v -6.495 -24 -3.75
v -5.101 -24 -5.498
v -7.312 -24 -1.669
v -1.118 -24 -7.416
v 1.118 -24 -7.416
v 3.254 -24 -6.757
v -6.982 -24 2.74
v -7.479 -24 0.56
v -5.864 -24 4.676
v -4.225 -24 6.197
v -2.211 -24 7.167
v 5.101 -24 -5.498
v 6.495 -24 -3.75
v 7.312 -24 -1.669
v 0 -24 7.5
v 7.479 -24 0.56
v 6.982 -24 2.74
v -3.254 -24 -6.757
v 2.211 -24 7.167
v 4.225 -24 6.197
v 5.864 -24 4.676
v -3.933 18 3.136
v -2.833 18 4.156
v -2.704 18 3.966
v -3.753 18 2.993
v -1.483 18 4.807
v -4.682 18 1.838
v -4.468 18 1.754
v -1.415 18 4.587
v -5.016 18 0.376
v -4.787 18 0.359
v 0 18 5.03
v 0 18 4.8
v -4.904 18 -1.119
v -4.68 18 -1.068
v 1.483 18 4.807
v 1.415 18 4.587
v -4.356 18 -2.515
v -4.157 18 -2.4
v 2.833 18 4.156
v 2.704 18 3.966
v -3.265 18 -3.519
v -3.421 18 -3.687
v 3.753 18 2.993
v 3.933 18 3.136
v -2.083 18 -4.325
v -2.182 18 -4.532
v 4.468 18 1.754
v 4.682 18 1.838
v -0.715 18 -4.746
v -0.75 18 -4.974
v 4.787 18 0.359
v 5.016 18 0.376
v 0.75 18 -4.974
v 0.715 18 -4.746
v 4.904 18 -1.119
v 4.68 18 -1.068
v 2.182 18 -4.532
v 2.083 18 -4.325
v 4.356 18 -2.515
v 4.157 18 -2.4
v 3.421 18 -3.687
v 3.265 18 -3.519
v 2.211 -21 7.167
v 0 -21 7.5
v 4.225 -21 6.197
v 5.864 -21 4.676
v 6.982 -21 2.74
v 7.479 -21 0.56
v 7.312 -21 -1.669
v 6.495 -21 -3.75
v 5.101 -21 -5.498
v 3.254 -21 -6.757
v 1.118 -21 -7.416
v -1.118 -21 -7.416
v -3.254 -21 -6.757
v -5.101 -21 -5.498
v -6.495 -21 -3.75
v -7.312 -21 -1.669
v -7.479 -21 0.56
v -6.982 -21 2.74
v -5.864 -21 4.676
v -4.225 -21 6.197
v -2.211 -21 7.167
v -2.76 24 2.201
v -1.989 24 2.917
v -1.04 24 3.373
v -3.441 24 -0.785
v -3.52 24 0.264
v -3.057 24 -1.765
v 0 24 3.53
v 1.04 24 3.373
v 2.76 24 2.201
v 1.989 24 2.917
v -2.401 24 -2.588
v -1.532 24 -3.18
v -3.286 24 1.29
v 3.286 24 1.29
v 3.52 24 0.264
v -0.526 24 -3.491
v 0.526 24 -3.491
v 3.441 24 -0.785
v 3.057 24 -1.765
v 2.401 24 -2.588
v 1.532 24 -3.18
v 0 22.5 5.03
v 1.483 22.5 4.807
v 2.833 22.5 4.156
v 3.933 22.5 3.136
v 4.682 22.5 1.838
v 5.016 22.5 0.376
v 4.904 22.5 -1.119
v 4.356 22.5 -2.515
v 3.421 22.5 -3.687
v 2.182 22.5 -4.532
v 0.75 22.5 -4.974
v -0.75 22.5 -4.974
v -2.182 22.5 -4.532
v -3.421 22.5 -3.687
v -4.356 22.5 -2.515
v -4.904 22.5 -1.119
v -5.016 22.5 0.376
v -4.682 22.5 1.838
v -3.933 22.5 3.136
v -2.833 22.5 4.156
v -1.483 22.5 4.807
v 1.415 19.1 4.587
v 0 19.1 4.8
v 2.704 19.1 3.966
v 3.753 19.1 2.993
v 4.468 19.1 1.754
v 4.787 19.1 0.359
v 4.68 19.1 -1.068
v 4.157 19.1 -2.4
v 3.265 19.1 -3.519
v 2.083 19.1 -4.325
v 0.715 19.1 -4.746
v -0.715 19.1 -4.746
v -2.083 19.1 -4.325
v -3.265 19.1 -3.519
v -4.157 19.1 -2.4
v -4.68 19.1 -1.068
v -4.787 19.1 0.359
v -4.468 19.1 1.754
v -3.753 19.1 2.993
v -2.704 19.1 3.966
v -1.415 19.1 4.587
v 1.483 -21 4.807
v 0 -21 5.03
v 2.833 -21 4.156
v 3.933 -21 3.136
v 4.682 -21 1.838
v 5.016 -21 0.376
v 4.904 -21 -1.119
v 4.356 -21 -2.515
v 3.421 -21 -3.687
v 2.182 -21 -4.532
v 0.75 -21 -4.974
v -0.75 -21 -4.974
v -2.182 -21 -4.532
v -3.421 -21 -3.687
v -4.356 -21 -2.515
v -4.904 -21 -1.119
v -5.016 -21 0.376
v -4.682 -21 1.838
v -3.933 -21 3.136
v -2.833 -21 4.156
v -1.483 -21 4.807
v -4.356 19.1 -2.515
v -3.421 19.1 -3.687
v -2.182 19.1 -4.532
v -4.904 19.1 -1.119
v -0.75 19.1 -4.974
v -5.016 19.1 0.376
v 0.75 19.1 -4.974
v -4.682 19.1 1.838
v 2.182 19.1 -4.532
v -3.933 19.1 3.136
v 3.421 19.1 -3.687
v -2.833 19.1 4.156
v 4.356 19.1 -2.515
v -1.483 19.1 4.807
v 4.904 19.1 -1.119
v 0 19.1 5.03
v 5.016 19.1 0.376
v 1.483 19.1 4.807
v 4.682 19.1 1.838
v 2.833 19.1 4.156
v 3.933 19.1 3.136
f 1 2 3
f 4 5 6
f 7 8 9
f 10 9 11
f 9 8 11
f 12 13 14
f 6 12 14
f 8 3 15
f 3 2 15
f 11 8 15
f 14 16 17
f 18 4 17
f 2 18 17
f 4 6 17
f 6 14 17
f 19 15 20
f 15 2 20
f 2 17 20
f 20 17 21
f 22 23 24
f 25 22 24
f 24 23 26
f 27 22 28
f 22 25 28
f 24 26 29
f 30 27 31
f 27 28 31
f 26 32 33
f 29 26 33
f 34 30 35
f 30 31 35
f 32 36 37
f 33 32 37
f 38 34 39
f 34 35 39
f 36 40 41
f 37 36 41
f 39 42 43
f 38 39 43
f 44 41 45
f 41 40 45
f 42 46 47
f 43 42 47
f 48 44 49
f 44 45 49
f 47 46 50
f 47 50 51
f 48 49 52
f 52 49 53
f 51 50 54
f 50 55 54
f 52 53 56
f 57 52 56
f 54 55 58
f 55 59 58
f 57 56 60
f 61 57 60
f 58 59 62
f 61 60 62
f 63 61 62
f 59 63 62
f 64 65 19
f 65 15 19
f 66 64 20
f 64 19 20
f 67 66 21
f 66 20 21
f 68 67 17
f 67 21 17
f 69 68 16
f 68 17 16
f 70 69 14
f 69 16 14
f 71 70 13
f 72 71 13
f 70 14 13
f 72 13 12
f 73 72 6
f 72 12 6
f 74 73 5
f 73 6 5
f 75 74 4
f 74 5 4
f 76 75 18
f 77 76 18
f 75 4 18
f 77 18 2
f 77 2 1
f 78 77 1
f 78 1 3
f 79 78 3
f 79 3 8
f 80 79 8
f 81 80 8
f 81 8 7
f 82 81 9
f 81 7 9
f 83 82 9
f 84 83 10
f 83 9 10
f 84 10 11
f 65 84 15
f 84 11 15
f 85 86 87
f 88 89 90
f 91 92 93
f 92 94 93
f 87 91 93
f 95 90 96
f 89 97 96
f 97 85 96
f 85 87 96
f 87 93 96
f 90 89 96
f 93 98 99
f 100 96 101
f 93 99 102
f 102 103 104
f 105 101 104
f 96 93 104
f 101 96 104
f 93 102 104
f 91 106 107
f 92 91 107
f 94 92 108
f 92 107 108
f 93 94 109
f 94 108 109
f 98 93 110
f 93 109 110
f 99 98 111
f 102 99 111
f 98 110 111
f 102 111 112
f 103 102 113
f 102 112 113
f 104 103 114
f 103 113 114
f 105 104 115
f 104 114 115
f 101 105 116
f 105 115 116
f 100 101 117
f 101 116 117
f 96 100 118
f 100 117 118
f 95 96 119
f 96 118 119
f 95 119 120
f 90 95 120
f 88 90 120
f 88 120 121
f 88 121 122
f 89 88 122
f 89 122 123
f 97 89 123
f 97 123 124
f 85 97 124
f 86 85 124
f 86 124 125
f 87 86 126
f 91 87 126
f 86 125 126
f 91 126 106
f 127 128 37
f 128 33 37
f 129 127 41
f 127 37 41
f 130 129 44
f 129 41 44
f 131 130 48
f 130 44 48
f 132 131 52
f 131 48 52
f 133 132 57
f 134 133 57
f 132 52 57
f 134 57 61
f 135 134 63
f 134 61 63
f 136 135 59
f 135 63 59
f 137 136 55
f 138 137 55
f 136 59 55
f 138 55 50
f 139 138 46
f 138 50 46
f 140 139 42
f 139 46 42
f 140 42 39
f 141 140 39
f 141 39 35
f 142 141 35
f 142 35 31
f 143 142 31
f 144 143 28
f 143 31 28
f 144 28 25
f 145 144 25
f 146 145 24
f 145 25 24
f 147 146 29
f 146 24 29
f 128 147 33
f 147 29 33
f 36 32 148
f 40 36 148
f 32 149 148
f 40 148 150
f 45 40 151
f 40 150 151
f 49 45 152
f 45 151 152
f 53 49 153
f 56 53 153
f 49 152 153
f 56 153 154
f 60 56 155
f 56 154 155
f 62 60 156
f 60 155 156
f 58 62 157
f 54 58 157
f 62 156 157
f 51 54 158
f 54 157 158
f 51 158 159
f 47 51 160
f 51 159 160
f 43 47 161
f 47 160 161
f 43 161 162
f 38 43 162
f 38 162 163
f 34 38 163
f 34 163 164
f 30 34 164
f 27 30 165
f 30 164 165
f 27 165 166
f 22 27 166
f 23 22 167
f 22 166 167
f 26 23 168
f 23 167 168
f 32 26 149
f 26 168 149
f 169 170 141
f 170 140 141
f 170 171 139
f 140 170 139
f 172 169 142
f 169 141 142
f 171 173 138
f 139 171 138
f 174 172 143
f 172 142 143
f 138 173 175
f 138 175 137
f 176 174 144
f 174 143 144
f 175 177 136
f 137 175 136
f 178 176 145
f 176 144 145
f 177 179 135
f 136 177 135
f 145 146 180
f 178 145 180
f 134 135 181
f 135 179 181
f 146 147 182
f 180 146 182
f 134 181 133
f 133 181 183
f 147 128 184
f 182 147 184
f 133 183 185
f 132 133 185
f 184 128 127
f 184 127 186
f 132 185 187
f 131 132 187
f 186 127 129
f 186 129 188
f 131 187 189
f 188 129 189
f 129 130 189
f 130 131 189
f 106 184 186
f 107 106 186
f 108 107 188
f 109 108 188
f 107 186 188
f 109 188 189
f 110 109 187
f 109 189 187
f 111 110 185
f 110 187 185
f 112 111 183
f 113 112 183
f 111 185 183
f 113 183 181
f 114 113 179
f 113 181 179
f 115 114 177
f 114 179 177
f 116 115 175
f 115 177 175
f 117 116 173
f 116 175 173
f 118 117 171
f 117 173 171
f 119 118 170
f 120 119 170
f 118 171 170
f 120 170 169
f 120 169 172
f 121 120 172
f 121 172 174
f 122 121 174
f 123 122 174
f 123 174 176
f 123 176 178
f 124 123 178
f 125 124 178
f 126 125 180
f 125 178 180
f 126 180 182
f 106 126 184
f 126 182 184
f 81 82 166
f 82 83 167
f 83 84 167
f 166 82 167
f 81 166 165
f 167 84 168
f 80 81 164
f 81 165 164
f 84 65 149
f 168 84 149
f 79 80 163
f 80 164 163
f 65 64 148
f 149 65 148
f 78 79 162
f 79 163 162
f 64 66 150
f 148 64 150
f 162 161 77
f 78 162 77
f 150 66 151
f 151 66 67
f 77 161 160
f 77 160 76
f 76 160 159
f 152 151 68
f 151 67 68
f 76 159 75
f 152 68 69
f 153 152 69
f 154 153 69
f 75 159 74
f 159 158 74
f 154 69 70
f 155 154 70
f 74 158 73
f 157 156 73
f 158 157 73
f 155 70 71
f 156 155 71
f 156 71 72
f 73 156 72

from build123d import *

# Parameters (mm, degrees)
F2_SIZE = 1.5


with BuildPart() as f1:
    # F0 (on Right) → F1 (revolve)
    with BuildSketch(Plane.YZ):
        Polygon((-21, 5.03), (-21, 7.5), (-24, 7.5), (-24, 0), (24, 0), (24, 5.03), (19.1, 5.03), (19.1, 4.8), (18, 4.8), (18, 5.03), align=None)
    revolve(axis=Axis((0, 0, 0), (0, 1, 0)))

    # F2
    f2_edges = [f1.edges().sort_by_distance(p)[0] for p in [
        (0, 24, -5.03),
    ]]
    chamfer(f2_edges, length=F2_SIZE)


solid = f1.part
